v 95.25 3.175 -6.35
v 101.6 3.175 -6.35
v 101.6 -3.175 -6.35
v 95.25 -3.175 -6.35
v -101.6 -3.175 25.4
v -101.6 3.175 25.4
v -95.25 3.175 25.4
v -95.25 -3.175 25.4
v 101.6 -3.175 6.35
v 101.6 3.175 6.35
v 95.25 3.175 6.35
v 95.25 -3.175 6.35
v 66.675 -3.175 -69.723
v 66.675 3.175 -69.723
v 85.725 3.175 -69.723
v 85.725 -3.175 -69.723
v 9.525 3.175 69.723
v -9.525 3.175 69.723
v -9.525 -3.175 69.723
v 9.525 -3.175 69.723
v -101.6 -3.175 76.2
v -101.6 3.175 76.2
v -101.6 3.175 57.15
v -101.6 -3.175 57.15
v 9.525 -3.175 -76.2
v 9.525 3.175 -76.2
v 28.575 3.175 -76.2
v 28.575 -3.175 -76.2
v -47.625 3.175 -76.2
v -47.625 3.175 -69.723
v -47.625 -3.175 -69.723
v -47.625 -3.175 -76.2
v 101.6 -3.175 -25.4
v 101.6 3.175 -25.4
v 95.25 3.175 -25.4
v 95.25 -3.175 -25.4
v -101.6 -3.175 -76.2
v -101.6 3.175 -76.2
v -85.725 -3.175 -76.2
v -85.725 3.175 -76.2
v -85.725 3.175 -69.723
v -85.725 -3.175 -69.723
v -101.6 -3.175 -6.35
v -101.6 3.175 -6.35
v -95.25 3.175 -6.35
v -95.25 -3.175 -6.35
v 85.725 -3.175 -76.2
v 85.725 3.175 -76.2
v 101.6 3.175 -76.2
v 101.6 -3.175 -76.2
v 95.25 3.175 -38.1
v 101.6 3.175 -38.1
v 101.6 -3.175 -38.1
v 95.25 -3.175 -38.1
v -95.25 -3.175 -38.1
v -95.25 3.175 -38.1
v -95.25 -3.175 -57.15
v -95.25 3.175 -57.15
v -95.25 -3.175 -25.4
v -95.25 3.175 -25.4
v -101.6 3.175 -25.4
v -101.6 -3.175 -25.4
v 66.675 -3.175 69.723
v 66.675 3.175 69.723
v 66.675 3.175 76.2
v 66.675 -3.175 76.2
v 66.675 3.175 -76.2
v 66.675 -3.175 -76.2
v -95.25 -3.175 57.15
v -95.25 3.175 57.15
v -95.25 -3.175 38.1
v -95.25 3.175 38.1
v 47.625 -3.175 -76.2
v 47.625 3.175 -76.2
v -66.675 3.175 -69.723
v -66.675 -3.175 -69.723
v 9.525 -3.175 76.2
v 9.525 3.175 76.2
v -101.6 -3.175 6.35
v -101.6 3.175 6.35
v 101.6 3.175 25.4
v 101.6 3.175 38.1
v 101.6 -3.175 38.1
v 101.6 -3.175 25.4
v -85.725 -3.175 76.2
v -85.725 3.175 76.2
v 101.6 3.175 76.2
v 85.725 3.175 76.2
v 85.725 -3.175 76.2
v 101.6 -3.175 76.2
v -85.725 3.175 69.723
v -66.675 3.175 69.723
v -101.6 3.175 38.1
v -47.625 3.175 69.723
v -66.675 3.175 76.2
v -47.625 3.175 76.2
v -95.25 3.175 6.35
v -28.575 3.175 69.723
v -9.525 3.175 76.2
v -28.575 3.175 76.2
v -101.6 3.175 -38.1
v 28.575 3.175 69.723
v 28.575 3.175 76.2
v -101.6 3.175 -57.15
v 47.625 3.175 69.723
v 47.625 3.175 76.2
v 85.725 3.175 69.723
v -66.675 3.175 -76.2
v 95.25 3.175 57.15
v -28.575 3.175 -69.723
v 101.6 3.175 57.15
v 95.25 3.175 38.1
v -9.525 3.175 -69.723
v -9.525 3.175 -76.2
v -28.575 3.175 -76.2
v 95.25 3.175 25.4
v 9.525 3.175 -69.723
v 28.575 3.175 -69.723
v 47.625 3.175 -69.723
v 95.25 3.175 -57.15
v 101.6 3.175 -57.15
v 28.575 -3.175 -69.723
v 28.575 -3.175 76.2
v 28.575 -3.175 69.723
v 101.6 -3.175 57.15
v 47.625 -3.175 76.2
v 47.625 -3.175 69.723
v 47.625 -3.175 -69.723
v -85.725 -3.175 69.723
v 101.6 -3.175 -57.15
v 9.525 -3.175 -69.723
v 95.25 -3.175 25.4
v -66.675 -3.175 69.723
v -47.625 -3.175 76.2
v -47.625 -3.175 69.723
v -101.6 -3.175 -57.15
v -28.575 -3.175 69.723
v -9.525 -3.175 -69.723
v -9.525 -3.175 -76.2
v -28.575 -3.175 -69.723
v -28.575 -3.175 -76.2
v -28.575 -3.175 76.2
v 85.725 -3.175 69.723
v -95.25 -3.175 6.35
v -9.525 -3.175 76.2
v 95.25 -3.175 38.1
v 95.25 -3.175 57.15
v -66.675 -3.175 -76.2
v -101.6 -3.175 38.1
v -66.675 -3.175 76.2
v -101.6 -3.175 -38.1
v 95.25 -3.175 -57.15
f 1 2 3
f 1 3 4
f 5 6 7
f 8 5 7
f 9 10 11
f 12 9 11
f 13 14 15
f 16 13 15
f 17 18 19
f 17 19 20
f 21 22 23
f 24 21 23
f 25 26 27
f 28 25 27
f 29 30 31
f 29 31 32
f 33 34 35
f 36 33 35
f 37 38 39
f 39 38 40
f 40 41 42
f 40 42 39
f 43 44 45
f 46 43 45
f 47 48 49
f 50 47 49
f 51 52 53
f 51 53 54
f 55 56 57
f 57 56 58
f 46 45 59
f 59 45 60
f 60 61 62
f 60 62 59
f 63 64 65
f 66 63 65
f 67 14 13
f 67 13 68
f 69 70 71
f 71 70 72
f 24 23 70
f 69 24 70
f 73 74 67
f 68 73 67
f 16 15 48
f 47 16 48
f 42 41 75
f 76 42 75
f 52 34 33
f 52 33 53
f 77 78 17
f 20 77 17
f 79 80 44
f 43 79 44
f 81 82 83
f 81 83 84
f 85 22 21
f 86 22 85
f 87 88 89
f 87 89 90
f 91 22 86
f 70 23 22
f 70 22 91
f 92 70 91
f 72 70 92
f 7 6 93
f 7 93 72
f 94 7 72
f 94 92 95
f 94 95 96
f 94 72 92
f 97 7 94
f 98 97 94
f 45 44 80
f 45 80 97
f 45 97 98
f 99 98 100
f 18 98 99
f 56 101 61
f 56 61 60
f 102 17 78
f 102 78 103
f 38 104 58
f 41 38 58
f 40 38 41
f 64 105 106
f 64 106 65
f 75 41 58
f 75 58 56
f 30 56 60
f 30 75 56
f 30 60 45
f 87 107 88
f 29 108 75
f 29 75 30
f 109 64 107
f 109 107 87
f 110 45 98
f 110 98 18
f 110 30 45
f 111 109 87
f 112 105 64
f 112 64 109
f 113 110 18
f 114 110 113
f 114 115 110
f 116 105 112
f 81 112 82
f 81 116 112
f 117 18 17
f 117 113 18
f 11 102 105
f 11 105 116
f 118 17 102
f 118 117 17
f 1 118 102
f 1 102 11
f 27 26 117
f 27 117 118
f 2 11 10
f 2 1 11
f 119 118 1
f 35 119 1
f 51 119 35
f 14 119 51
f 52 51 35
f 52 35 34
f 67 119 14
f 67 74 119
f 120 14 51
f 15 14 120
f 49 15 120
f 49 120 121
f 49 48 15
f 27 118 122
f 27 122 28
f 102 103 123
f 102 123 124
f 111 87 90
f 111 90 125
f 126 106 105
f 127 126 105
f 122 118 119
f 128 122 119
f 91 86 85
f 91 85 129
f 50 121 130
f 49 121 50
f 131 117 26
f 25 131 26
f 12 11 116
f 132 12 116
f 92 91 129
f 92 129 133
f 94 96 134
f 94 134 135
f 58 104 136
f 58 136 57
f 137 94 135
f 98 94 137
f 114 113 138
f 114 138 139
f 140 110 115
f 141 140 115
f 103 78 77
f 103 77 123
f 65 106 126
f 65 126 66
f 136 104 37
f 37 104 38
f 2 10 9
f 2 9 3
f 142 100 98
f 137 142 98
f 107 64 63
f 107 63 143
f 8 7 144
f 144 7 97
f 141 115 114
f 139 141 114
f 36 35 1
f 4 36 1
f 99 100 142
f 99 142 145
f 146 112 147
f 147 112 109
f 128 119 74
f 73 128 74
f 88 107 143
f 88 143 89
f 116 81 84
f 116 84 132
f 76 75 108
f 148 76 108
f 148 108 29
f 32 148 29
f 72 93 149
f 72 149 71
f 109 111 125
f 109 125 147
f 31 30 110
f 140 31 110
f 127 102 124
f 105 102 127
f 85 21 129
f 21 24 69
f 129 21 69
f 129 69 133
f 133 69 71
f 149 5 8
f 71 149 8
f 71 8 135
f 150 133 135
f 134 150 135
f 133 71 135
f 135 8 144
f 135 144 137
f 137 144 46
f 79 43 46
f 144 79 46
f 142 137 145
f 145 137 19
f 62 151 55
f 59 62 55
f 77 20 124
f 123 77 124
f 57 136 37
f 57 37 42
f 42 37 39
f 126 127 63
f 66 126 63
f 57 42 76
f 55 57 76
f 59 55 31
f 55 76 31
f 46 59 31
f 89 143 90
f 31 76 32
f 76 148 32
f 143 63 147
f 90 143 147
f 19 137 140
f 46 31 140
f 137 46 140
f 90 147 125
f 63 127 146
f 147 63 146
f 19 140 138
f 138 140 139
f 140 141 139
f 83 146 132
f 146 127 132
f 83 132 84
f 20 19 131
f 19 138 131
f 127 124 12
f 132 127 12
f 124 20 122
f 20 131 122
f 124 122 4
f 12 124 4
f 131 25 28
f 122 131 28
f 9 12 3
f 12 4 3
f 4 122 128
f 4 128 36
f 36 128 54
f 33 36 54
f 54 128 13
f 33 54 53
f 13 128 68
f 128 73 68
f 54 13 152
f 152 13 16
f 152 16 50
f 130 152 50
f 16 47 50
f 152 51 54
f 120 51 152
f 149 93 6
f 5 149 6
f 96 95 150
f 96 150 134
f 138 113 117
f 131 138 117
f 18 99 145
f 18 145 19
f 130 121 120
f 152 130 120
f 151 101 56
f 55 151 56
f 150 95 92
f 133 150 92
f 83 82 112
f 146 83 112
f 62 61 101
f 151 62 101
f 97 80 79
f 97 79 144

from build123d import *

# Parameters (mm, degrees)
SKETCH1_W               = 203.2
SKETCH1_H               = 152.4
BOSS_EXTRUDE1_DEPTH     = 3.175
SKETCH2_W               = 19.05
SKETCH2_H               = 6.477
CUT_EXTRUDE1_DEPTH      = 128.158650905
LPATTERN1_COUNT         = 5
LPATTERN1_PITCH         = 38.1
MIRROR1_COPY_1_SKETCH_W = 19.05
MIRROR1_COPY_1_SKETCH_H = 6.477
MIRROR1_COPY_1_DEPTH    = 128.158650905
MIRROR1_COPY_2_SKETCH_W = 19.05
MIRROR1_COPY_2_SKETCH_H = 6.477
MIRROR1_COPY_2_DEPTH    = 128.158650905
MIRROR1_COPY_3_SKETCH_W = 19.05
MIRROR1_COPY_3_SKETCH_H = 6.477
MIRROR1_COPY_3_DEPTH    = 128.158650905
MIRROR1_COPY_4_SKETCH_W = 19.05
MIRROR1_COPY_4_SKETCH_H = 6.477
MIRROR1_COPY_4_DEPTH    = 128.158650905
SKETCH3_W               = 6.35
SKETCH3_H               = 19.05
CUT_EXTRUDE2_DEPTH      = 128.158650905
LPATTERN2_COUNT         = 4
LPATTERN2_PITCH         = 31.75
MIRROR2_COPY_1_SKETCH_W = 6.35
MIRROR2_COPY_1_SKETCH_H = 19.05
MIRROR2_COPY_1_DEPTH    = 128.158650905
MIRROR2_COPY_2_SKETCH_W = 6.35
MIRROR2_COPY_2_SKETCH_H = 19.05
MIRROR2_COPY_2_DEPTH    = 128.158650905
MIRROR2_COPY_3_SKETCH_W = 6.35
MIRROR2_COPY_3_SKETCH_H = 19.05
MIRROR2_COPY_3_DEPTH    = 128.158650905


with BuildPart() as part:
    # Sketch1 → Boss-Extrude1 (new, symmetric)
    with BuildSketch(Plane(origin=(0, 0, 0), x_dir=(1, 0, 0), z_dir=(0, 1, 0))):
        Rectangle(SKETCH1_W, SKETCH1_H)
    extrude(amount=BOSS_EXTRUDE1_DEPTH, both=True)

    # Sketch2 → Cut-Extrude1 (cut, through all)
    with BuildSketch(Plane(origin=(0, 3.175, 0), x_dir=(1, 0, 0), z_dir=(0, 1, 0))):
        with Locations((76.2, 72.9615)):
            Rectangle(SKETCH2_W, SKETCH2_H)
    cut_extrude1 = extrude(amount=-CUT_EXTRUDE1_DEPTH, mode=Mode.SUBTRACT)

    # LPattern1: Cut-Extrude1 ×5
    with Locations(*[(-i * LPATTERN1_PITCH, 0, 0) for i in range(1, LPATTERN1_COUNT)]):
        add(cut_extrude1, mode=Mode.SUBTRACT)

    # Mirror1: Cut-Extrude1 across plane
    add(cut_extrude1.mirror(Plane.XY), mode=Mode.SUBTRACT)

    # Mirror1 copy 1 sketch → Mirror1 copy 1 (cut, through all)
    with BuildSketch(Plane(origin=(-38.1, 3.175, 0), x_dir=(1, 0, 0), z_dir=(0, 1, 0))):
        with Locations((76.2, -72.9615)):
            Rectangle(MIRROR1_COPY_1_SKETCH_W, MIRROR1_COPY_1_SKETCH_H)
    extrude(amount=-MIRROR1_COPY_1_DEPTH, mode=Mode.SUBTRACT)

    # Mirror1 copy 2 sketch → Mirror1 copy 2 (cut, through all)
    with BuildSketch(Plane(origin=(-76.2, 3.175, 0), x_dir=(1, 0, 0), z_dir=(0, 1, 0))):
        with Locations((76.2, -72.9615)):
            Rectangle(MIRROR1_COPY_2_SKETCH_W, MIRROR1_COPY_2_SKETCH_H)
    extrude(amount=-MIRROR1_COPY_2_DEPTH, mode=Mode.SUBTRACT)

    # Mirror1 copy 3 sketch → Mirror1 copy 3 (cut, through all)
    with BuildSketch(Plane(origin=(-114.3, 3.175, 0), x_dir=(1, 0, 0), z_dir=(0, 1, 0))):
        with Locations((76.2, -72.9615)):
            Rectangle(MIRROR1_COPY_3_SKETCH_W, MIRROR1_COPY_3_SKETCH_H)
    extrude(amount=-MIRROR1_COPY_3_DEPTH, mode=Mode.SUBTRACT)

    # Mirror1 copy 4 sketch → Mirror1 copy 4 (cut, through all)
    with BuildSketch(Plane(origin=(-152.4, 3.175, 0), x_dir=(1, 0, 0), z_dir=(0, 1, 0))):
        with Locations((76.2, -72.9615)):
            Rectangle(MIRROR1_COPY_4_SKETCH_W, MIRROR1_COPY_4_SKETCH_H)
    extrude(amount=-MIRROR1_COPY_4_DEPTH, mode=Mode.SUBTRACT)

    # Sketch3 → Cut-Extrude2 (cut, through all)
    with BuildSketch(Plane(origin=(0, 3.175, 0), x_dir=(1, 0, 0), z_dir=(0, 1, 0))):
        with Locations((-98.425, 47.625)):
            Rectangle(SKETCH3_W, SKETCH3_H)
    cut_extrude2 = extrude(amount=-CUT_EXTRUDE2_DEPTH, mode=Mode.SUBTRACT)

    # LPattern2: Cut-Extrude2 ×4
    with Locations(*[(0, 0, i * LPATTERN2_PITCH) for i in range(1, LPATTERN2_COUNT)]):
        add(cut_extrude2, mode=Mode.SUBTRACT)

    # Mirror2: Cut-Extrude2 across plane
    add(cut_extrude2.mirror(Plane(origin=(0, 0, 0), x_dir=(0, 0, 1), z_dir=(1, 0, 0))), mode=Mode.SUBTRACT)

    # Mirror2 copy 1 sketch → Mirror2 copy 1 (cut, through all)
    with BuildSketch(Plane(origin=(0, 3.175, 31.75), x_dir=(-1, 0, 0), z_dir=(0, 1, 0))):
        with Locations((-98.425, -47.625)):
            Rectangle(MIRROR2_COPY_1_SKETCH_W, MIRROR2_COPY_1_SKETCH_H)
    extrude(amount=-MIRROR2_COPY_1_DEPTH, mode=Mode.SUBTRACT)

    # Mirror2 copy 2 sketch → Mirror2 copy 2 (cut, through all)
    with BuildSketch(Plane(origin=(0, 3.175, 63.5), x_dir=(-1, 0, 0), z_dir=(0, 1, 0))):
        with Locations((-98.425, -47.625)):
            Rectangle(MIRROR2_COPY_2_SKETCH_W, MIRROR2_COPY_2_SKETCH_H)
    extrude(amount=-MIRROR2_COPY_2_DEPTH, mode=Mode.SUBTRACT)

    # Mirror2 copy 3 sketch → Mirror2 copy 3 (cut, through all)
    with BuildSketch(Plane(origin=(0, 3.175, 95.25), x_dir=(-1, 0, 0), z_dir=(0, 1, 0))):
        with Locations((-98.425, -47.625)):
            Rectangle(MIRROR2_COPY_3_SKETCH_W, MIRROR2_COPY_3_SKETCH_H)
    extrude(amount=-MIRROR2_COPY_3_DEPTH, mode=Mode.SUBTRACT)


solid = part.part
